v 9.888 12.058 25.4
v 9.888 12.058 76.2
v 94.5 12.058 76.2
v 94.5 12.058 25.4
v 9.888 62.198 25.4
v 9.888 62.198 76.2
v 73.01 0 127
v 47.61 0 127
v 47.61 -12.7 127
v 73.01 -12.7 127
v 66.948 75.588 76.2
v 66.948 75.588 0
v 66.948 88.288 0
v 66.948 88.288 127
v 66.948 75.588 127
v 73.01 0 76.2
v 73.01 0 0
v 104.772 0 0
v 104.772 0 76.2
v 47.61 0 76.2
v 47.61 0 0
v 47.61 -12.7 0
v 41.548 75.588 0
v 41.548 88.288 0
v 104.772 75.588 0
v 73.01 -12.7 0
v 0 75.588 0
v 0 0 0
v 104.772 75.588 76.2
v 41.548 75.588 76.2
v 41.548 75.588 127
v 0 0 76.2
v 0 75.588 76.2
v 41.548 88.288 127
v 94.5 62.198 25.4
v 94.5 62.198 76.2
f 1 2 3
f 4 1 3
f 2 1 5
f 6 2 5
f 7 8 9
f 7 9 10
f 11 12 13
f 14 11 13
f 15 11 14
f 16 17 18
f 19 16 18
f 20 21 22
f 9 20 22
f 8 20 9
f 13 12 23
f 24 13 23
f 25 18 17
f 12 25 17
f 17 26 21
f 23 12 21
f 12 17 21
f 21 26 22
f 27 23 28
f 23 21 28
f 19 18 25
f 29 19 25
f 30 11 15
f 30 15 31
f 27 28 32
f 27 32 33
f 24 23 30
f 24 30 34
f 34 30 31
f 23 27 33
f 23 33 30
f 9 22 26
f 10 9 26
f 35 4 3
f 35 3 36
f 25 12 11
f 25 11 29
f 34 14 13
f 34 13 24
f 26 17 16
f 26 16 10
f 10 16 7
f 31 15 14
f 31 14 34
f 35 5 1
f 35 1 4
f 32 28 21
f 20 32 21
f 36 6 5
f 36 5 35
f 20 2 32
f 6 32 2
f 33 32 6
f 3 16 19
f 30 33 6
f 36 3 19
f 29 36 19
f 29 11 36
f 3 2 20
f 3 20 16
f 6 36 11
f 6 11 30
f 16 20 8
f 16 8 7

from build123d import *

# Parameters (mm, degrees)
F0_W     = 104.771569
F0_H     = 75.58772
F1_DEPTH = 76.2
F2_W     = 84.611864
F2_H     = 50.140363
F3_DEPTH = 50.8
F4_W     = 25.4
F4_H     = 127
F5_DEPTH = 12.7
F6_W     = 25.4
F6_H     = 127
F7_DEPTH = 12.7


with BuildPart() as f1:
    # F0 (on Top) → F1 (new body)
    with BuildSketch(Plane.XY):
        with Locations((52.385784, 37.79386)):
            Rectangle(F0_W, F0_H)
    extrude(amount=F1_DEPTH)

    # F2 (on face) → F3 (cut)
    with BuildSketch(Plane.XY.offset(76.2)):
        with Locations((52.194364, 37.128242)):
            Rectangle(F2_W, F2_H)
    extrude(amount=-F3_DEPTH, mode=Mode.SUBTRACT)

    # F4 (on face) → F5 (join)
    with BuildSketch(Plane.XZ):
        with Locations((60.309702, 63.5)):
            Rectangle(F4_W, F4_H)
    extrude(amount=F5_DEPTH)

    # F6 (on face) → F7 (join)
    with BuildSketch(Plane(origin=(0, 75.58772, 0), x_dir=(-1, 0, 0), z_dir=(0, 1, 0))):
        with Locations((-54.248451, 63.5)):
            Rectangle(F6_W, F6_H)
    extrude(amount=F7_DEPTH)


solid = f1.part
